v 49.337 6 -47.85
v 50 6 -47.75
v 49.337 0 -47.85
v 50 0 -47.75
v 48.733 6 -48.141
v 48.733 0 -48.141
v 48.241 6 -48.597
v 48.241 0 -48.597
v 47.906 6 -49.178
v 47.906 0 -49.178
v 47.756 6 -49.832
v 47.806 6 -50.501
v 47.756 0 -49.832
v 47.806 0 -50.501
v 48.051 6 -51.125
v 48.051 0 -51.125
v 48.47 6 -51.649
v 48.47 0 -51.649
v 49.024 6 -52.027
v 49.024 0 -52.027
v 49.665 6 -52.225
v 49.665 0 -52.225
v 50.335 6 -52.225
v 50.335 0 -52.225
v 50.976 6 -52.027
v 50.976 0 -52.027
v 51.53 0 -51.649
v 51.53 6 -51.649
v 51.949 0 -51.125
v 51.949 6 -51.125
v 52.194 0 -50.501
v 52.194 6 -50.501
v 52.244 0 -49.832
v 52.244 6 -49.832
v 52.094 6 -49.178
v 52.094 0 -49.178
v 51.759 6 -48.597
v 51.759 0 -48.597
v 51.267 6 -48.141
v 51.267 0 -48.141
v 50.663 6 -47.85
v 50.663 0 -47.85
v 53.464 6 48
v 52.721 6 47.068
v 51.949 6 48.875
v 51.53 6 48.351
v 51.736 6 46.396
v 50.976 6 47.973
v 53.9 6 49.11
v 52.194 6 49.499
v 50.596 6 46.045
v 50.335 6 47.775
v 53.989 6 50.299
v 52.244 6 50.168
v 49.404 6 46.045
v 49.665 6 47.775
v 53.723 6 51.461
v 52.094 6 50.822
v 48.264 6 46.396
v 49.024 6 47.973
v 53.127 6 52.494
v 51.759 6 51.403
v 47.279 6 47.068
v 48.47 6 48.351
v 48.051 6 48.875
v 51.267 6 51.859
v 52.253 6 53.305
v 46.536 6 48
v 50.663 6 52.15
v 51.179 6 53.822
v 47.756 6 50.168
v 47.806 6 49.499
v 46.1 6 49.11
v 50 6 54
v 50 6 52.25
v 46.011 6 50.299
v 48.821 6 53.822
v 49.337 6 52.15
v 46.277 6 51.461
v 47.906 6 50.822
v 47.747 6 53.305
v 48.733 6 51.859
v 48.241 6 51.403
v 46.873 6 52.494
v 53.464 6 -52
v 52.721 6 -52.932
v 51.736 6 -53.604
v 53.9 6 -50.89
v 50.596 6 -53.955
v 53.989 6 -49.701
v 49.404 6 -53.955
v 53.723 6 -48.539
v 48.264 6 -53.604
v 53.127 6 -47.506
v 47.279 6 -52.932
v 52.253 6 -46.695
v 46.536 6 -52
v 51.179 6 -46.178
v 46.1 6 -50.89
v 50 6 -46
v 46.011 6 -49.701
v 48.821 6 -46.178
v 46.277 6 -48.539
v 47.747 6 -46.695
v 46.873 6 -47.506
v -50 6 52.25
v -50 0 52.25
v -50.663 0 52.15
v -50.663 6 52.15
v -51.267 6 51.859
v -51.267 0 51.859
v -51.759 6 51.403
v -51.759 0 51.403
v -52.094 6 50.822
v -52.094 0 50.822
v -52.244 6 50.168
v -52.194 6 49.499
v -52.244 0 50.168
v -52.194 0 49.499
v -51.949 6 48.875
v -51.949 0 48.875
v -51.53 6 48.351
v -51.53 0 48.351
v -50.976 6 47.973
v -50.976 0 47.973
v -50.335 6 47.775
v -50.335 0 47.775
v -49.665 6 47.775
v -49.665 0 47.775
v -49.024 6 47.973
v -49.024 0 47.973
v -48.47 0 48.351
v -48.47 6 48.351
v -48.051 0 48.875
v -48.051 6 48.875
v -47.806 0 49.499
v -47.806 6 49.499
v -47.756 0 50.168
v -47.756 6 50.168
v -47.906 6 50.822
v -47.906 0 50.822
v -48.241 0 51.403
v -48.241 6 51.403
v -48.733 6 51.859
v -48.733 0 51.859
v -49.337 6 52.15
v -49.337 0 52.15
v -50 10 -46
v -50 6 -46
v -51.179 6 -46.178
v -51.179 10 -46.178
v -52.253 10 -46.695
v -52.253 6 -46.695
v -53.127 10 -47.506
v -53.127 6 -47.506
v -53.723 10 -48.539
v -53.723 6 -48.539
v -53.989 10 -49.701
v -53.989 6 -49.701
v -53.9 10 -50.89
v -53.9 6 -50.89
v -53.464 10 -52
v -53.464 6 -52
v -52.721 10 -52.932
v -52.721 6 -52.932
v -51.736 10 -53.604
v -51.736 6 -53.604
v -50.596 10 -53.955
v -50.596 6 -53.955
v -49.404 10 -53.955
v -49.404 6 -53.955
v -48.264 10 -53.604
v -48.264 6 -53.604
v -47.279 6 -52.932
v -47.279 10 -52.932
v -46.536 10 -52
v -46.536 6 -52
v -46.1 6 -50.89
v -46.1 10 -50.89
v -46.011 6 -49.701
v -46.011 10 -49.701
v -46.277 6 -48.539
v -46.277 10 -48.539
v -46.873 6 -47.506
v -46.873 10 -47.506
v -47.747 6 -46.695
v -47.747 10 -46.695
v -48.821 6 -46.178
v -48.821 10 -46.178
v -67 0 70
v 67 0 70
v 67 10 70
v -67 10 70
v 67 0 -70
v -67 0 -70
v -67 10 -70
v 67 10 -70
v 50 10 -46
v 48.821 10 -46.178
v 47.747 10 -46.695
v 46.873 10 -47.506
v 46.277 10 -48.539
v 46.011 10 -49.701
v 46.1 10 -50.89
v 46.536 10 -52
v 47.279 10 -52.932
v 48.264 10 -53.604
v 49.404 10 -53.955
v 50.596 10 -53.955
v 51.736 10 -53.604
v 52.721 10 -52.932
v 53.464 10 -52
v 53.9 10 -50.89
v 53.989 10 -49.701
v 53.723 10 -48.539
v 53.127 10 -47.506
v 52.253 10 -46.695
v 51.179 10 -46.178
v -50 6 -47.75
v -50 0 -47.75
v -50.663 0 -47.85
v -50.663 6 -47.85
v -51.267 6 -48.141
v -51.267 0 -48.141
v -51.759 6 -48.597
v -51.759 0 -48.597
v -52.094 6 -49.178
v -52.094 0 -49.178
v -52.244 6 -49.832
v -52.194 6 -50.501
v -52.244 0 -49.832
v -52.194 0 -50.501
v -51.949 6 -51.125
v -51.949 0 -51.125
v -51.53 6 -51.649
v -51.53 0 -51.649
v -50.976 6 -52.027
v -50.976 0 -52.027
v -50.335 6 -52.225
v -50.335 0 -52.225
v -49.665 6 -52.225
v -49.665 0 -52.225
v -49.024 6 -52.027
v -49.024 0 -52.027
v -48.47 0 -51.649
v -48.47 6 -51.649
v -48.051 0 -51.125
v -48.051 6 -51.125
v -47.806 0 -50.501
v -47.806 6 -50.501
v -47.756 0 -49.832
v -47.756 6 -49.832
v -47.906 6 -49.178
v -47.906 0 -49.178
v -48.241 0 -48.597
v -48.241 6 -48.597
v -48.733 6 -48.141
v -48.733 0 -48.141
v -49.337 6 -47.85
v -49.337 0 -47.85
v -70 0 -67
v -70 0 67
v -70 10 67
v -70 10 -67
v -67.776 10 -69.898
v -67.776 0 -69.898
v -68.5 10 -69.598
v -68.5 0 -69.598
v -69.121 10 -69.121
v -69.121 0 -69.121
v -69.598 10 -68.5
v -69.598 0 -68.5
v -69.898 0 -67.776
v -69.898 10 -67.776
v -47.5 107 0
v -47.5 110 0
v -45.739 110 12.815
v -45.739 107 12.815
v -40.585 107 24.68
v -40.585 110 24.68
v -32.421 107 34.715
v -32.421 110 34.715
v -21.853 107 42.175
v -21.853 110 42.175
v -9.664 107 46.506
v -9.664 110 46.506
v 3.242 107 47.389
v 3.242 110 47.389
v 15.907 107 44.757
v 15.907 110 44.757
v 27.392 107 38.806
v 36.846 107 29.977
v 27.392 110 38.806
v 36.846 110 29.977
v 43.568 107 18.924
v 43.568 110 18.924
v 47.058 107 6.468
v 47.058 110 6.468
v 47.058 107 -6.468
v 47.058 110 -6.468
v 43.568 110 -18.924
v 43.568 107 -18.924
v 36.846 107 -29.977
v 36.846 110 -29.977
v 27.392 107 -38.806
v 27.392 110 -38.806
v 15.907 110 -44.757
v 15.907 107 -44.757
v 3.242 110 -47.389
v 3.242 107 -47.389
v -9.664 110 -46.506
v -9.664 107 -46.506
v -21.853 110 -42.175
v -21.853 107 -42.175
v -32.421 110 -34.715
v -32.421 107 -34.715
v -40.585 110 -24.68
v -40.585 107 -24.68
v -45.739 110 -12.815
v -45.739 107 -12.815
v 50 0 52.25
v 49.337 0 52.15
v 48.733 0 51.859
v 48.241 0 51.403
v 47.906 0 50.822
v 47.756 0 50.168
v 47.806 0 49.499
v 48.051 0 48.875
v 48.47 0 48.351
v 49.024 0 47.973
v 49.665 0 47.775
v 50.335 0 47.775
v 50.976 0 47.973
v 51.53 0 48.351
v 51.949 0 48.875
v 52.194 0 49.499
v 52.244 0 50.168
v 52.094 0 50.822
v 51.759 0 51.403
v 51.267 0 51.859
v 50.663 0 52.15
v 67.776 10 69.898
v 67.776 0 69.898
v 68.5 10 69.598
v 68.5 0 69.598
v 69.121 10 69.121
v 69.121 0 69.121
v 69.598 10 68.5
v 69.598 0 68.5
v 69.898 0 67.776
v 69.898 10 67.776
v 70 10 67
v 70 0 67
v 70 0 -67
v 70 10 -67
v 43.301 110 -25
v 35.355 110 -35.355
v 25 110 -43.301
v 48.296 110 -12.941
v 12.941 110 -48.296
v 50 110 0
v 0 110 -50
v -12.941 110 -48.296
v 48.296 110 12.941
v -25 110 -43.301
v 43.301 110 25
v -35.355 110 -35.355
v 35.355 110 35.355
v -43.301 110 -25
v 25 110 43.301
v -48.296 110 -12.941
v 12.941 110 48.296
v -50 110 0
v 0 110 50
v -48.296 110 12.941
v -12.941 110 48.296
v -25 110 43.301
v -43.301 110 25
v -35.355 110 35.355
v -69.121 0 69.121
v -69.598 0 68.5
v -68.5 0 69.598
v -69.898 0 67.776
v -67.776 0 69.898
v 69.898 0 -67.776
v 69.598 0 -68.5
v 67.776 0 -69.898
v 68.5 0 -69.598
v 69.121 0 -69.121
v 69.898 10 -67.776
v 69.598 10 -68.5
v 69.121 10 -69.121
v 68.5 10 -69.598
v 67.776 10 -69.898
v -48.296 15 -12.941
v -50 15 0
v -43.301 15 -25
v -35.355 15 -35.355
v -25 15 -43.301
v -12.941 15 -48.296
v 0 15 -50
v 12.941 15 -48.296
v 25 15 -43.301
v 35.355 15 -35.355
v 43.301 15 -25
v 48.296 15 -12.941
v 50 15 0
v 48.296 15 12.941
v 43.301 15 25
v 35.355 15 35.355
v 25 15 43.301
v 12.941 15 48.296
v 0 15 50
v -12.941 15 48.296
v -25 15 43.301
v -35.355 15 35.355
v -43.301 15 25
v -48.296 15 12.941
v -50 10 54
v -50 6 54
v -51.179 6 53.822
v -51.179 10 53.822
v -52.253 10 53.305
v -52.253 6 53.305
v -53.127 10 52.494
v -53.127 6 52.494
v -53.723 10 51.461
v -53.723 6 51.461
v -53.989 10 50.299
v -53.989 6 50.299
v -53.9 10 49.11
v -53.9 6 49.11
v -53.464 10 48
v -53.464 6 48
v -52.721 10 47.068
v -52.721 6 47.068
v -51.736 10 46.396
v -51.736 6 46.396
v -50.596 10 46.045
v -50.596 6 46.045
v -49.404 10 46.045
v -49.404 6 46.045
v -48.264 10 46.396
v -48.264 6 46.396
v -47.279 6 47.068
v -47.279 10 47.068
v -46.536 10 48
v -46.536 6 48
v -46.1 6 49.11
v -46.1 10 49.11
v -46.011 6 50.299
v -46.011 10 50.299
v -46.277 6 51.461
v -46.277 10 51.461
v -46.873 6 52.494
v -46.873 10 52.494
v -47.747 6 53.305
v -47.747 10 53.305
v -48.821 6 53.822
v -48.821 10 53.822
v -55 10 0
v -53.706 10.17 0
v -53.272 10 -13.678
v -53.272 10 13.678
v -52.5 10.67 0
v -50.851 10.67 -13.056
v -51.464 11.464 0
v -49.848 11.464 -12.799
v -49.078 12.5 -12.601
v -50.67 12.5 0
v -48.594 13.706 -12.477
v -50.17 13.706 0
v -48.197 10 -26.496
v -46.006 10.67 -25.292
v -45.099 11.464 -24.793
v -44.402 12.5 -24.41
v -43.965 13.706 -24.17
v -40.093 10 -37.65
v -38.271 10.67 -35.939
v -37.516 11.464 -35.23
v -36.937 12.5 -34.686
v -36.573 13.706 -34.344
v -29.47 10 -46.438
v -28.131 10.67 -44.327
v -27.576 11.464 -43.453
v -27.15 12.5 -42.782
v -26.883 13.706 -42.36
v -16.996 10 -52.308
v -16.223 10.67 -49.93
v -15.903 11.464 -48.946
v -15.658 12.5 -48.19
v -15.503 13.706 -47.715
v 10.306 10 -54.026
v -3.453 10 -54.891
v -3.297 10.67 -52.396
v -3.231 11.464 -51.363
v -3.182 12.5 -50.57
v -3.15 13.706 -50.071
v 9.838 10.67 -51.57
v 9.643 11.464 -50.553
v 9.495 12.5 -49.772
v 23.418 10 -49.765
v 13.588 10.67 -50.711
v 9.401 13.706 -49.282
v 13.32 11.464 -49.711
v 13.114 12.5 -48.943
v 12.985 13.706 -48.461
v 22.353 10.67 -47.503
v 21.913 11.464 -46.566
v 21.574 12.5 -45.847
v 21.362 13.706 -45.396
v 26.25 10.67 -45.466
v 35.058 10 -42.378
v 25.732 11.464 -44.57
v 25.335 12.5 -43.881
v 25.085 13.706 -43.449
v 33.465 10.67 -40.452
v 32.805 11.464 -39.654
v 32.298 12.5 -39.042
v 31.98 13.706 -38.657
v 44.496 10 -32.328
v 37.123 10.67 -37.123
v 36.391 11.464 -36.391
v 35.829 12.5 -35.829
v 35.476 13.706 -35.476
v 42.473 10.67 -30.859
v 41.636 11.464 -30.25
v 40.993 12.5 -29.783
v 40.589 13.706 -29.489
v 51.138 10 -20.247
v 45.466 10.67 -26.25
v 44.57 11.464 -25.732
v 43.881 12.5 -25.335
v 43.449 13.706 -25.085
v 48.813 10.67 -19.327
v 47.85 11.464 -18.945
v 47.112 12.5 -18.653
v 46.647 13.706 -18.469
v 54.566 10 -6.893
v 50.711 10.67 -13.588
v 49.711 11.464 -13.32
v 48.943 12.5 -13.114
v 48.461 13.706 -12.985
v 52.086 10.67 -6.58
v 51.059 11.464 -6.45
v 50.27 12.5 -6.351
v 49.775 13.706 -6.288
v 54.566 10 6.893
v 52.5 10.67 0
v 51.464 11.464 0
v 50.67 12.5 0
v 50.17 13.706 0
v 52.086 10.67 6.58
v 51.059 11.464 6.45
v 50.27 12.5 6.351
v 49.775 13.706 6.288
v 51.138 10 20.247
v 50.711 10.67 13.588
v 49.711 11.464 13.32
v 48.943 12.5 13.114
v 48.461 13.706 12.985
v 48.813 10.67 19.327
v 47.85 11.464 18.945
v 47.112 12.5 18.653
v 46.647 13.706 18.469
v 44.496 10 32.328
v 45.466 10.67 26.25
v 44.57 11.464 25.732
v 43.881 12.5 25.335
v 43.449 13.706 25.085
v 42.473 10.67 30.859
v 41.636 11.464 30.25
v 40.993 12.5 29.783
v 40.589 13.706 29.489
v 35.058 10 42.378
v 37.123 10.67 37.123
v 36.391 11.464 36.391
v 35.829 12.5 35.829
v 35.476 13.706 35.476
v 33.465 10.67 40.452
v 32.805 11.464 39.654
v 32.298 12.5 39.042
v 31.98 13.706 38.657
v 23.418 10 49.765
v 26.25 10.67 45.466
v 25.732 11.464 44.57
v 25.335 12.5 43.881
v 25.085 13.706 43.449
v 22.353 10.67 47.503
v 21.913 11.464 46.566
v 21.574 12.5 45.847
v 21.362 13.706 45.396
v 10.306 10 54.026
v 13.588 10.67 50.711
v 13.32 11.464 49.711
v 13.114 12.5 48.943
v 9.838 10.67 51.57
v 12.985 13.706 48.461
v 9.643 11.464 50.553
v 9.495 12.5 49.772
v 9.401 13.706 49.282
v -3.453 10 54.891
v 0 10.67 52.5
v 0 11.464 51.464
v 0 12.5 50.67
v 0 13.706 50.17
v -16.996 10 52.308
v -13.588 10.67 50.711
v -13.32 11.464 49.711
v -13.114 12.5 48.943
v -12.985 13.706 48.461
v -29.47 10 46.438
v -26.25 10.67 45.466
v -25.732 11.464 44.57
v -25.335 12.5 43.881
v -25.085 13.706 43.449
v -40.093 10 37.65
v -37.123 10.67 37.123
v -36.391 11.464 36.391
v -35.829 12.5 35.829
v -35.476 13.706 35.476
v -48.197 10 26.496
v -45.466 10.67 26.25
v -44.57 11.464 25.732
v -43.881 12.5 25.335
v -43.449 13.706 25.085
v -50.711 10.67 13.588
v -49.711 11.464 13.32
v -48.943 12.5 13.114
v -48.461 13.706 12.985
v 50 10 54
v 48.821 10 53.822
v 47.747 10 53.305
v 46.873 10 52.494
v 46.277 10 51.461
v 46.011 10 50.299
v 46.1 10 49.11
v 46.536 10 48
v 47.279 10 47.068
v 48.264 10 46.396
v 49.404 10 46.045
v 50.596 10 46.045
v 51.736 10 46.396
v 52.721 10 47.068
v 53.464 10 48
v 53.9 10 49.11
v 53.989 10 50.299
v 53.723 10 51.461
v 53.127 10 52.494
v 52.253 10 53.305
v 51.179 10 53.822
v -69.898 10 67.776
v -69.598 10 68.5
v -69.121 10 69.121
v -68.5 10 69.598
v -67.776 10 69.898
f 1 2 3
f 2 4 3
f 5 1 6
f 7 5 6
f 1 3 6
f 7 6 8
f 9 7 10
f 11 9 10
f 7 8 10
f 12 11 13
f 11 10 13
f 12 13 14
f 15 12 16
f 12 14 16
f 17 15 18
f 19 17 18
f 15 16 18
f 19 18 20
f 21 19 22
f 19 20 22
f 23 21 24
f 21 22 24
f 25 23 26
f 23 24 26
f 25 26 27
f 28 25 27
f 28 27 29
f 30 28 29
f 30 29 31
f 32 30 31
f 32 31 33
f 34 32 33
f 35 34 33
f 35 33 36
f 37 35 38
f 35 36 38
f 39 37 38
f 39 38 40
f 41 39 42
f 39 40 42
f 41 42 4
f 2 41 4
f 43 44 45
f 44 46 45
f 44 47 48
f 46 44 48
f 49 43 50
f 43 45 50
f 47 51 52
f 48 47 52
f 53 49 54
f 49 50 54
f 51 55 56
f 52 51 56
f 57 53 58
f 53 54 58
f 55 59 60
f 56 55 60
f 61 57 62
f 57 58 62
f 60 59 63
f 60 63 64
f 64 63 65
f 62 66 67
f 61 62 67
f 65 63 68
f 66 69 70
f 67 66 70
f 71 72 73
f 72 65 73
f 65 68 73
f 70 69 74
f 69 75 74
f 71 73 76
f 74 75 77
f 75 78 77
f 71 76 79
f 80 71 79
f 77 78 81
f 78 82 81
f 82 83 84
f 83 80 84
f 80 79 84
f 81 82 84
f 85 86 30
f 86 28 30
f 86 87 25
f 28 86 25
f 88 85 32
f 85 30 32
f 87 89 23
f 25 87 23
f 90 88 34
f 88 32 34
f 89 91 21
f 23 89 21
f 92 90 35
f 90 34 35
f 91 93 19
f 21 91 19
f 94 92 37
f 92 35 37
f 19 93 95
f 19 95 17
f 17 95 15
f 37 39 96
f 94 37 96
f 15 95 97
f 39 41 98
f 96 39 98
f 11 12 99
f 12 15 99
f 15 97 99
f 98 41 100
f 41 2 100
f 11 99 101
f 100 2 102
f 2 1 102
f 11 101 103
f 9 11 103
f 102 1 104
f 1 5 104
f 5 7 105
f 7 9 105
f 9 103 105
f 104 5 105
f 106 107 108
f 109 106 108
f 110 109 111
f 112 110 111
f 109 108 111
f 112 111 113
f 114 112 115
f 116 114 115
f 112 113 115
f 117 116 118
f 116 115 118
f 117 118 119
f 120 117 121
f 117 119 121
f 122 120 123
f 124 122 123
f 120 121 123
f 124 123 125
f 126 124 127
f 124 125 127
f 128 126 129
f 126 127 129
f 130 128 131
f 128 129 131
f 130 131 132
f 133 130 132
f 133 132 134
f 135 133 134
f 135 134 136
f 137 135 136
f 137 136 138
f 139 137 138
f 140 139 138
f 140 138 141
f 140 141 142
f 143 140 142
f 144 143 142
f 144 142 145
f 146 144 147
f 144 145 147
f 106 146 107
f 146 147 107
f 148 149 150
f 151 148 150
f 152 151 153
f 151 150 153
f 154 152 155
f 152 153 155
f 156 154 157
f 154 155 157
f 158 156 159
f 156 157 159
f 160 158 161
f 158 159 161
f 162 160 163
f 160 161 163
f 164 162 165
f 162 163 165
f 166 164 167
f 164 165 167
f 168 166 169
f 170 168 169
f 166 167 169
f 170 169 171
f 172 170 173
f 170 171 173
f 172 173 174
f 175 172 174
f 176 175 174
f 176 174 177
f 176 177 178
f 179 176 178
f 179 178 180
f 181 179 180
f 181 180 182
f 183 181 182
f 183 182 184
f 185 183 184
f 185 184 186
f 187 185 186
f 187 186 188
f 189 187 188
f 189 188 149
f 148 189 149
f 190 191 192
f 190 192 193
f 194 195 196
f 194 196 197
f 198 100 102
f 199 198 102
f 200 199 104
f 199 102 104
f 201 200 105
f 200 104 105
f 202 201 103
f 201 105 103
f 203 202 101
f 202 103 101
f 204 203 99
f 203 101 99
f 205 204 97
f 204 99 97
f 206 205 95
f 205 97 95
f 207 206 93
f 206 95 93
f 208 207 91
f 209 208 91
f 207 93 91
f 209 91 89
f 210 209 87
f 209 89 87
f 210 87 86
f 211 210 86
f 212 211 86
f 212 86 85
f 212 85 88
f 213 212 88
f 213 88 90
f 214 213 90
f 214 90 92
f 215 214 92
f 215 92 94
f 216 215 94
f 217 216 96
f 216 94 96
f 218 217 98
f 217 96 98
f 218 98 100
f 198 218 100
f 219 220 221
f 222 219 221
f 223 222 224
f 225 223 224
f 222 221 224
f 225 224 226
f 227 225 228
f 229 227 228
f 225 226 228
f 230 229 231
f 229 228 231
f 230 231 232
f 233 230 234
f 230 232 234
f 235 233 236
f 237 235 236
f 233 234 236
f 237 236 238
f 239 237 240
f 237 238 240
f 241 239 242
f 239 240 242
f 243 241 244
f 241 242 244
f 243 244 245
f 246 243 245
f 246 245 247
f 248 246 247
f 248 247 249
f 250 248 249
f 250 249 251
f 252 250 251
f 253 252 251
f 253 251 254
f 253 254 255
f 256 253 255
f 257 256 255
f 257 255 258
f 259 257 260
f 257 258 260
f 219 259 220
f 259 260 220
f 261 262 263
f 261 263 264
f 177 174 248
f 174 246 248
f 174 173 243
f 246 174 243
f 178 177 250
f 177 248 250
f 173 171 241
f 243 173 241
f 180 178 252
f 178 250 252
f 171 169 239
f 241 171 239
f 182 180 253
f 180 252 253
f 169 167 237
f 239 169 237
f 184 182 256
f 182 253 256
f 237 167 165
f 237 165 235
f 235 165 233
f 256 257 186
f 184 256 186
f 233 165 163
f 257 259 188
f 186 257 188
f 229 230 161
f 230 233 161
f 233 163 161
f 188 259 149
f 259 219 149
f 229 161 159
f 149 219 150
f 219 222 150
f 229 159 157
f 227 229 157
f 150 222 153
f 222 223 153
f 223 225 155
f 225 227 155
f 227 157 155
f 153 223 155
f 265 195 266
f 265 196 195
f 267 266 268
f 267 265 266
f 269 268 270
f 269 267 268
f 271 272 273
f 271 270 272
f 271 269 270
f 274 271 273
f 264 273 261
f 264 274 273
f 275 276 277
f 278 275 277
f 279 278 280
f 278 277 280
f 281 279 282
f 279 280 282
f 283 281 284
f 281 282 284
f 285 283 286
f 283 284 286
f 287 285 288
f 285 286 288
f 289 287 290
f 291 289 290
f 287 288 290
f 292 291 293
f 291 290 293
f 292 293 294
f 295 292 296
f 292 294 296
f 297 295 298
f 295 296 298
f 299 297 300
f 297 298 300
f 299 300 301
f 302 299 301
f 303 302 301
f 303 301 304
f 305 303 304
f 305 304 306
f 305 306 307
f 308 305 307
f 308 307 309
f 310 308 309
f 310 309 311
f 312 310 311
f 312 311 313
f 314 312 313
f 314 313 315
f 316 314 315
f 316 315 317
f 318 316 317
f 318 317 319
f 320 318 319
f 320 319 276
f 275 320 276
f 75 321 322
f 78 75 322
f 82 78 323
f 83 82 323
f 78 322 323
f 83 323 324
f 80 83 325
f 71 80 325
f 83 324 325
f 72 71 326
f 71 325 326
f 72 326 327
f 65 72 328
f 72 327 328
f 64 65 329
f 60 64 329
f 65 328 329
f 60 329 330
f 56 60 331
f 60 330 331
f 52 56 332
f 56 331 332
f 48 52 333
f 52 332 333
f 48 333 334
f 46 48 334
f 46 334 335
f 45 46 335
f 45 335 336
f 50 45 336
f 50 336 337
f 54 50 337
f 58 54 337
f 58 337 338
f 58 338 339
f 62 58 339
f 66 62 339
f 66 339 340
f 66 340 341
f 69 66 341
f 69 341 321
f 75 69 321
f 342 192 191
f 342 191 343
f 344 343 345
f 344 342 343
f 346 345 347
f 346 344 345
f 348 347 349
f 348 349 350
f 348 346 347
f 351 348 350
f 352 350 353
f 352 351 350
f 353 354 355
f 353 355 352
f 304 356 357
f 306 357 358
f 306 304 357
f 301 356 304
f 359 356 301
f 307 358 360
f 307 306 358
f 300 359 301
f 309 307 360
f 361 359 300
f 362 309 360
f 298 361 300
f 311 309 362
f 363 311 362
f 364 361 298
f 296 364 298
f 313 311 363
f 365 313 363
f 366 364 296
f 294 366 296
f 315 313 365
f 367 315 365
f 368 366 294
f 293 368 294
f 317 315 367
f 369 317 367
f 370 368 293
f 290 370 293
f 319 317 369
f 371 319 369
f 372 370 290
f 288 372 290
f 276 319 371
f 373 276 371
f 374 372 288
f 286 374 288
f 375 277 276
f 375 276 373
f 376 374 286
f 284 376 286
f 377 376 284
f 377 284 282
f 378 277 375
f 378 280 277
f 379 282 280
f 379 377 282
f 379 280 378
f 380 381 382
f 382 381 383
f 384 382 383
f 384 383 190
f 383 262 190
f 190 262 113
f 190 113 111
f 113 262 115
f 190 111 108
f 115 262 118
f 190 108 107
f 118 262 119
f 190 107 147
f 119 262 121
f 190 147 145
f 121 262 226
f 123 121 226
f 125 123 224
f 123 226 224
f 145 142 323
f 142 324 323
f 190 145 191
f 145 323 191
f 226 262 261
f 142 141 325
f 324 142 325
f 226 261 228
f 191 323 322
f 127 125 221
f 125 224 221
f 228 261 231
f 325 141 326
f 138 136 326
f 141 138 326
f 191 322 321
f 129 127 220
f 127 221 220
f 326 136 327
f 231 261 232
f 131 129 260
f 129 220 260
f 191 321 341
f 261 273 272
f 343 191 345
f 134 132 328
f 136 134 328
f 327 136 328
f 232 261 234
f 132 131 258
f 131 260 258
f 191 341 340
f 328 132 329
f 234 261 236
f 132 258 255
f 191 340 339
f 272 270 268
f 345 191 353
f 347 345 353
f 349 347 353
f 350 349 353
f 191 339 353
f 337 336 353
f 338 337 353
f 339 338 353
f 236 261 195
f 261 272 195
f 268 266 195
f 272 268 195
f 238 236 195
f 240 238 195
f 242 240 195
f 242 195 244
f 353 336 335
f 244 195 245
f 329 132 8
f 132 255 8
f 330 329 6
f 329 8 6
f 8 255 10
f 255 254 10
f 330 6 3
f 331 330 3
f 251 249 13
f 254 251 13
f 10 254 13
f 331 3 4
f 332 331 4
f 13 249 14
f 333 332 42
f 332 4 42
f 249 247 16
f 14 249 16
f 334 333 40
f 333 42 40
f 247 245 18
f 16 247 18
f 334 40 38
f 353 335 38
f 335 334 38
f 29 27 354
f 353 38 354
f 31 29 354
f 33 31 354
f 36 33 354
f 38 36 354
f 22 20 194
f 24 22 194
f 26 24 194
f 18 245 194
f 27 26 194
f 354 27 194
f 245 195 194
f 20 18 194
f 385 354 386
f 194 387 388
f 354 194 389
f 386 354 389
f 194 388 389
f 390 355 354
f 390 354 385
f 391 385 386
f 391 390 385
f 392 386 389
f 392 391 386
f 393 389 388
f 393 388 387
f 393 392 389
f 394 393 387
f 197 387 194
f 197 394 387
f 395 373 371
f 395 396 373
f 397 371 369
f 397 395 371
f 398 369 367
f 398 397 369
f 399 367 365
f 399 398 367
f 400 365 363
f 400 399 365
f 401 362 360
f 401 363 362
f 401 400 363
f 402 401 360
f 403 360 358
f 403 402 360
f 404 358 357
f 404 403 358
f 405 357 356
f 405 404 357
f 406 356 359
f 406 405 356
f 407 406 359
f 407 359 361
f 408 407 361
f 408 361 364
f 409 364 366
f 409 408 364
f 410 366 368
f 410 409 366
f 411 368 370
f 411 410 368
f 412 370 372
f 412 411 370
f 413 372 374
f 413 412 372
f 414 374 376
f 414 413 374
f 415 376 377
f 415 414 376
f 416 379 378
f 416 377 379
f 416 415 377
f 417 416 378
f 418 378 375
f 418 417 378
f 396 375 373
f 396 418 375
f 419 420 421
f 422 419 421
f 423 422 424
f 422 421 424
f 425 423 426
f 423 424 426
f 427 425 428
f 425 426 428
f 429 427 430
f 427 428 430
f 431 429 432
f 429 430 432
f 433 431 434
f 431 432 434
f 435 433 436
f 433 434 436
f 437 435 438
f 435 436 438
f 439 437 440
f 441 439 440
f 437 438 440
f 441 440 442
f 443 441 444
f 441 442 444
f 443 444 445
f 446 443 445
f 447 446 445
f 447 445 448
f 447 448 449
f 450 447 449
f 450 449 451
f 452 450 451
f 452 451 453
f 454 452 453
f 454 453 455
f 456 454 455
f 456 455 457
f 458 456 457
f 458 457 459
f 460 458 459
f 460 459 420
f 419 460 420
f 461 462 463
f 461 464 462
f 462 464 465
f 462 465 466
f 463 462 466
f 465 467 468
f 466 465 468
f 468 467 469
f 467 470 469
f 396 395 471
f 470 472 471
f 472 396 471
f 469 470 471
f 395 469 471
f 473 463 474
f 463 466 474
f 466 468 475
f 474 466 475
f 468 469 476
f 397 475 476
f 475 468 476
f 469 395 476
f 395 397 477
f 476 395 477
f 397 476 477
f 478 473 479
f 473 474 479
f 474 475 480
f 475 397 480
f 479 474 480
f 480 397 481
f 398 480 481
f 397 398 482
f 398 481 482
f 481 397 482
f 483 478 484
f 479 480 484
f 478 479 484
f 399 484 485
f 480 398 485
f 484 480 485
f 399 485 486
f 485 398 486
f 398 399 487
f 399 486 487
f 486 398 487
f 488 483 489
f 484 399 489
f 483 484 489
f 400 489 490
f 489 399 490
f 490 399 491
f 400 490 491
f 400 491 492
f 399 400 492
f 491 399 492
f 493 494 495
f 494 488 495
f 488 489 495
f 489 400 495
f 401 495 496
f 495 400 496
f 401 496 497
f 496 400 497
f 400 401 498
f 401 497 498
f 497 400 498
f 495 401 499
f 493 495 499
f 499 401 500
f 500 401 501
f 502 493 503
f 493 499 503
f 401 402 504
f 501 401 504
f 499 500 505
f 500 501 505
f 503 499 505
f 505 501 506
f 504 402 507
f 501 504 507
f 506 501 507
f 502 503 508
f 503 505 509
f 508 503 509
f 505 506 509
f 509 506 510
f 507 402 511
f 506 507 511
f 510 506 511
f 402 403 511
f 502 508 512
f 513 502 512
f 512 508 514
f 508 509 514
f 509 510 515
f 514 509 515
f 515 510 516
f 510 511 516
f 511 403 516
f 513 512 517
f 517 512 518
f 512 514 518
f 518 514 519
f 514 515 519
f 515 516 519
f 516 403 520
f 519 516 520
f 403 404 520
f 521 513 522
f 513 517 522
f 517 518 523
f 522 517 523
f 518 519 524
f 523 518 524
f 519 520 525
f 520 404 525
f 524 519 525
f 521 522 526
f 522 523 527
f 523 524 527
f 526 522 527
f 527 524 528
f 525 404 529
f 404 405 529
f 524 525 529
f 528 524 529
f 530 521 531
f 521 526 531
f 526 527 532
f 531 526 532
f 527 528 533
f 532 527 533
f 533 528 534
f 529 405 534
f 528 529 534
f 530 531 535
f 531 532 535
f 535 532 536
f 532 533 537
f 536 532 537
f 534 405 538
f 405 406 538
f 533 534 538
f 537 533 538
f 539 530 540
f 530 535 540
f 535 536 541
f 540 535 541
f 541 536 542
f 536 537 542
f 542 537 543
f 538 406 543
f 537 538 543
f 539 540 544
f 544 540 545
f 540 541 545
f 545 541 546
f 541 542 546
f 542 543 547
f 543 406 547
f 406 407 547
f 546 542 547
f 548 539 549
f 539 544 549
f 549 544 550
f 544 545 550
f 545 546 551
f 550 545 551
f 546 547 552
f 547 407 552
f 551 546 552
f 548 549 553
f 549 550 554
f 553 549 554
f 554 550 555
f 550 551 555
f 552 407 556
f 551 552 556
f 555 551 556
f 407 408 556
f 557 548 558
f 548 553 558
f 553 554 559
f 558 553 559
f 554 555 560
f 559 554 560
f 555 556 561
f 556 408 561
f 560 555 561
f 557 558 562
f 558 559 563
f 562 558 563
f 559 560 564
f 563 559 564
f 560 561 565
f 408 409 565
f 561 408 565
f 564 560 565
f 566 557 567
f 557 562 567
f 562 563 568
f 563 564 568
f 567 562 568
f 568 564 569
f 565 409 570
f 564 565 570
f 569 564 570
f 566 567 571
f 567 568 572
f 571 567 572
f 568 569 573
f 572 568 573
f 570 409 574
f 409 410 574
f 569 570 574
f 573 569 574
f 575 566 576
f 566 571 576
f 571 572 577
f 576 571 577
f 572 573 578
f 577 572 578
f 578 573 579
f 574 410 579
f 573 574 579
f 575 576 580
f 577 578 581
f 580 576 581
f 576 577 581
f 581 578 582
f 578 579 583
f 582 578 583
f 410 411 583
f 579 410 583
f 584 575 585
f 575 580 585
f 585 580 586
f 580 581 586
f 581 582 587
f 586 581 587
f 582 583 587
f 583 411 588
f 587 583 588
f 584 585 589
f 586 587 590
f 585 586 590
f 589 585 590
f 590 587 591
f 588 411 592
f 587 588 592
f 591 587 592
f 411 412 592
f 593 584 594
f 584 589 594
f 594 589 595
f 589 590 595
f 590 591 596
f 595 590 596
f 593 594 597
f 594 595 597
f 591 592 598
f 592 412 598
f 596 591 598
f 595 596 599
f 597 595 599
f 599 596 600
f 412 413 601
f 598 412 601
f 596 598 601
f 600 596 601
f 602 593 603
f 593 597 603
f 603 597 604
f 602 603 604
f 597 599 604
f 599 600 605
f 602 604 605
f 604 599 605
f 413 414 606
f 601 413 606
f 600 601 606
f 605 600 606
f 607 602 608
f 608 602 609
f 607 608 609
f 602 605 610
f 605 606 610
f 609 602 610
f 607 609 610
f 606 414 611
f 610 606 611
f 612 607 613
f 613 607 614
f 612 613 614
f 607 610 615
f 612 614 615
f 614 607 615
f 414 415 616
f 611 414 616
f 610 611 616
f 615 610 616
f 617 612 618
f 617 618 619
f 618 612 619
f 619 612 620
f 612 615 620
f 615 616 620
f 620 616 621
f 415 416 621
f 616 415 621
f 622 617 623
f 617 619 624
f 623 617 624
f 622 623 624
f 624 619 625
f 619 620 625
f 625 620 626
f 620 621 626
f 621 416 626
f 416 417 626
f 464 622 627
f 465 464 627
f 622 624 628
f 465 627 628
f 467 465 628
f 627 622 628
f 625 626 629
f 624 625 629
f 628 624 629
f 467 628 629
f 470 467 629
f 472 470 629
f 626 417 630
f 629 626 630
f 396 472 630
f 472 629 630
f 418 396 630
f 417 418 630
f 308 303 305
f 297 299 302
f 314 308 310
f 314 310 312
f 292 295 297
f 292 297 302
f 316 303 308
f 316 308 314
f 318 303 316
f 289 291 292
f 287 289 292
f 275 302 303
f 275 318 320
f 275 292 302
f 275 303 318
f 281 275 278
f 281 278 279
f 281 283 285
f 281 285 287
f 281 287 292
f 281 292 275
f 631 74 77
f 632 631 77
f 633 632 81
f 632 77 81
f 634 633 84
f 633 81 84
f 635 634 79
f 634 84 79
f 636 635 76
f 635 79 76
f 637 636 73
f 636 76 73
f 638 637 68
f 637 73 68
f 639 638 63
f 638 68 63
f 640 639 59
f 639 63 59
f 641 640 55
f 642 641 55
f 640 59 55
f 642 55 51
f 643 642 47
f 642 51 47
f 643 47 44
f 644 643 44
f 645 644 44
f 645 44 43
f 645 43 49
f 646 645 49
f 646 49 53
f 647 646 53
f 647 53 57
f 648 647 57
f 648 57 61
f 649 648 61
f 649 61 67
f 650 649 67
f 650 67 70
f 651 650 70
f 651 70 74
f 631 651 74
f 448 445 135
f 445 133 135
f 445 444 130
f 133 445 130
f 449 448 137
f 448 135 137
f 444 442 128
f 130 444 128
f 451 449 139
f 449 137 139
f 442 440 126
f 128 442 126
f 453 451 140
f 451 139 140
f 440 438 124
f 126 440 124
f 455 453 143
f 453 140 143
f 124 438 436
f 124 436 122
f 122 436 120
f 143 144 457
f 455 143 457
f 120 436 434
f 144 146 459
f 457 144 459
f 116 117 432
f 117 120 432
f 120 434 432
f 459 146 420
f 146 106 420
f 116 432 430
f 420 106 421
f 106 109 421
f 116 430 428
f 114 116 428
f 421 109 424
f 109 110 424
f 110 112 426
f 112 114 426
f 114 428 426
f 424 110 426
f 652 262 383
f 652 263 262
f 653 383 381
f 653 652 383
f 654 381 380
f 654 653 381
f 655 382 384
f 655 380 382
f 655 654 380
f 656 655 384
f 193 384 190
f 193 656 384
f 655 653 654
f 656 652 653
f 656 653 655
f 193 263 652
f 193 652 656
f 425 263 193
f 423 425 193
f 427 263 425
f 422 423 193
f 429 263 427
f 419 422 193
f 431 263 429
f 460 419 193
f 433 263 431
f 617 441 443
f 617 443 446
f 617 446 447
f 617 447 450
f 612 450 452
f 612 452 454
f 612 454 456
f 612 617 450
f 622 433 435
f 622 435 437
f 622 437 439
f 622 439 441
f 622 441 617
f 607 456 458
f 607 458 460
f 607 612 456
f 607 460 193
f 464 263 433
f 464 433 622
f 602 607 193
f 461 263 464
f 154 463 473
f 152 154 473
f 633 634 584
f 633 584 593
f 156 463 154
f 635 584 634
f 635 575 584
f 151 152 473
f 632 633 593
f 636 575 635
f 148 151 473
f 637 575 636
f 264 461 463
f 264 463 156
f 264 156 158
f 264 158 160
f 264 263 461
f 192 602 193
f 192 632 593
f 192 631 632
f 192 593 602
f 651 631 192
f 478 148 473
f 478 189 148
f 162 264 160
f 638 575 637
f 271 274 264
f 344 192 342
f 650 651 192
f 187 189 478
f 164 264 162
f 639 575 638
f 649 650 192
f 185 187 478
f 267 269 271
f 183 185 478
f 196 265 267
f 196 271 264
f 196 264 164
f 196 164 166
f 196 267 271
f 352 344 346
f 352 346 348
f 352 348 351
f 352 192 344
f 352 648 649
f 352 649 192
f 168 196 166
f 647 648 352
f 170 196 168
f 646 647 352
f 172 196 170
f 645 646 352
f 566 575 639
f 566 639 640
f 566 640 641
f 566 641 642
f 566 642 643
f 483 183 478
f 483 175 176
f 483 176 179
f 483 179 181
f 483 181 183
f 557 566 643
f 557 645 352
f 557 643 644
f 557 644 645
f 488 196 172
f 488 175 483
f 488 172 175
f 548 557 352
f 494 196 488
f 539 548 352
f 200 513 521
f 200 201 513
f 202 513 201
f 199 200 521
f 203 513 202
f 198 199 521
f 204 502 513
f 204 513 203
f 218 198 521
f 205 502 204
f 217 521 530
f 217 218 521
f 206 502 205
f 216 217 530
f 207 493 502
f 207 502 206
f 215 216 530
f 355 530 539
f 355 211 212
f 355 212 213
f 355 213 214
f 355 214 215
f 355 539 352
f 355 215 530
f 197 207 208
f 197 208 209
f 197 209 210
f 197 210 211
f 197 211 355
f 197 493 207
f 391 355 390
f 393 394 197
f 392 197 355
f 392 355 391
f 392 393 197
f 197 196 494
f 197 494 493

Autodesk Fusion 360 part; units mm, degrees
sketch "Sketch1" plane through (0, 0, 0) normal (0, 1, 0) x (1, 0, 0)
  line L0 (70, -70) -> (-70, -70)
  line L1 (-70, -70) -> (-70, 70)
  line L2 (-70, 70) -> (70, 70)
  line L3 (70, 70) -> (70, -70)
  line L4 (70, -70) -> (-70, 70) construction
  line L5 (-70, -70) -> (70, 70) construction
  dimension "d1" = 140
  dimension "d2" = 140
extrude "Extrude1" add sketch "Sketch1" along normal blind 10
sketch "Sketch2" plane through (0, 10, 0) normal (0, 1, 0) x (-1, 0, 0)
  line L0 (-70, -70) -> (70, -70)
  line L1 (70, -70) -> (70, 70)
  line L2 (70, 70) -> (-70, 70)
  line L3 (-70, 70) -> (-70, -70)
  circle A0 centre (0, 0) radius 50
  dimension "d5" = 100
extrude "Extrude2" add sketch "Sketch2" along normal blind 100 contours A0
sketch "Sketch3" plane through (0, 0, 0) normal (0, 0, 1) x (1, 0, 0)
  line L0 (-40, 80) -> (40, 80)
  line L1 (40, 80) -> (40, 40)
  line L2 (40, 40) -> (-40, 40)
  line L3 (-40, 40) -> (-40, 80)
  dimension "d8" = 80
  dimension "d9" = 40
  dimension "d10" = 40
  dimension "d11" = 40
sketch "Sketch4" plane through (0, 110, 0) normal (0, 1, 0) x (-1, 0, 0)
  circle A0 centre (0, 0) radius 50
  circle A1 centre (0, 0) radius 47.5
  dimension "d14" = 95
extrude "Extrude4" cut sketch "Sketch4" against normal blind 3 contours A1
sketch "Sketch5" plane through (0, 10, 0) normal (0, 1, 0) x (-1, 0, 0)
  circle A0 centre (0, 0) radius 50
  line L0 (-70, -70) -> (70, -70)
  line L1 (70, -70) -> (70, 70)
  line L2 (70, 70) -> (-70, 70)
  line L3 (-70, 70) -> (-70, -70)
  point P0 (50, -50)
  point P1 (-50, -50)
  point P2 (-50, 50)
  point P3 (50, 50)
  dimension "d17" = 20
  dimension "d18" = 20
  dimension "d19" = 20
  dimension "d20" = 20
  dimension "d21" = 20
  dimension "d22" = 20
  dimension "d23" = 20
  dimension "d24" = 20
hole "Hole1" at (50, 10, -50) at (-50, 10, -50) at (-50, 10, 50) at (50, 10, 50) direction (0, -1, 0) diameter 4.5 depth 40 tip angle 118 counterbore diameter 8 counterbore depth 4
fillet "Fillet1" radius 3 4 edges at (70, 5, 70) (-70, 5, 70) (70, 5, -70) (-70, 5, -70)
fillet "Fillet4" radius 5 1 edges at (46.6164, 10, 18.0808)
